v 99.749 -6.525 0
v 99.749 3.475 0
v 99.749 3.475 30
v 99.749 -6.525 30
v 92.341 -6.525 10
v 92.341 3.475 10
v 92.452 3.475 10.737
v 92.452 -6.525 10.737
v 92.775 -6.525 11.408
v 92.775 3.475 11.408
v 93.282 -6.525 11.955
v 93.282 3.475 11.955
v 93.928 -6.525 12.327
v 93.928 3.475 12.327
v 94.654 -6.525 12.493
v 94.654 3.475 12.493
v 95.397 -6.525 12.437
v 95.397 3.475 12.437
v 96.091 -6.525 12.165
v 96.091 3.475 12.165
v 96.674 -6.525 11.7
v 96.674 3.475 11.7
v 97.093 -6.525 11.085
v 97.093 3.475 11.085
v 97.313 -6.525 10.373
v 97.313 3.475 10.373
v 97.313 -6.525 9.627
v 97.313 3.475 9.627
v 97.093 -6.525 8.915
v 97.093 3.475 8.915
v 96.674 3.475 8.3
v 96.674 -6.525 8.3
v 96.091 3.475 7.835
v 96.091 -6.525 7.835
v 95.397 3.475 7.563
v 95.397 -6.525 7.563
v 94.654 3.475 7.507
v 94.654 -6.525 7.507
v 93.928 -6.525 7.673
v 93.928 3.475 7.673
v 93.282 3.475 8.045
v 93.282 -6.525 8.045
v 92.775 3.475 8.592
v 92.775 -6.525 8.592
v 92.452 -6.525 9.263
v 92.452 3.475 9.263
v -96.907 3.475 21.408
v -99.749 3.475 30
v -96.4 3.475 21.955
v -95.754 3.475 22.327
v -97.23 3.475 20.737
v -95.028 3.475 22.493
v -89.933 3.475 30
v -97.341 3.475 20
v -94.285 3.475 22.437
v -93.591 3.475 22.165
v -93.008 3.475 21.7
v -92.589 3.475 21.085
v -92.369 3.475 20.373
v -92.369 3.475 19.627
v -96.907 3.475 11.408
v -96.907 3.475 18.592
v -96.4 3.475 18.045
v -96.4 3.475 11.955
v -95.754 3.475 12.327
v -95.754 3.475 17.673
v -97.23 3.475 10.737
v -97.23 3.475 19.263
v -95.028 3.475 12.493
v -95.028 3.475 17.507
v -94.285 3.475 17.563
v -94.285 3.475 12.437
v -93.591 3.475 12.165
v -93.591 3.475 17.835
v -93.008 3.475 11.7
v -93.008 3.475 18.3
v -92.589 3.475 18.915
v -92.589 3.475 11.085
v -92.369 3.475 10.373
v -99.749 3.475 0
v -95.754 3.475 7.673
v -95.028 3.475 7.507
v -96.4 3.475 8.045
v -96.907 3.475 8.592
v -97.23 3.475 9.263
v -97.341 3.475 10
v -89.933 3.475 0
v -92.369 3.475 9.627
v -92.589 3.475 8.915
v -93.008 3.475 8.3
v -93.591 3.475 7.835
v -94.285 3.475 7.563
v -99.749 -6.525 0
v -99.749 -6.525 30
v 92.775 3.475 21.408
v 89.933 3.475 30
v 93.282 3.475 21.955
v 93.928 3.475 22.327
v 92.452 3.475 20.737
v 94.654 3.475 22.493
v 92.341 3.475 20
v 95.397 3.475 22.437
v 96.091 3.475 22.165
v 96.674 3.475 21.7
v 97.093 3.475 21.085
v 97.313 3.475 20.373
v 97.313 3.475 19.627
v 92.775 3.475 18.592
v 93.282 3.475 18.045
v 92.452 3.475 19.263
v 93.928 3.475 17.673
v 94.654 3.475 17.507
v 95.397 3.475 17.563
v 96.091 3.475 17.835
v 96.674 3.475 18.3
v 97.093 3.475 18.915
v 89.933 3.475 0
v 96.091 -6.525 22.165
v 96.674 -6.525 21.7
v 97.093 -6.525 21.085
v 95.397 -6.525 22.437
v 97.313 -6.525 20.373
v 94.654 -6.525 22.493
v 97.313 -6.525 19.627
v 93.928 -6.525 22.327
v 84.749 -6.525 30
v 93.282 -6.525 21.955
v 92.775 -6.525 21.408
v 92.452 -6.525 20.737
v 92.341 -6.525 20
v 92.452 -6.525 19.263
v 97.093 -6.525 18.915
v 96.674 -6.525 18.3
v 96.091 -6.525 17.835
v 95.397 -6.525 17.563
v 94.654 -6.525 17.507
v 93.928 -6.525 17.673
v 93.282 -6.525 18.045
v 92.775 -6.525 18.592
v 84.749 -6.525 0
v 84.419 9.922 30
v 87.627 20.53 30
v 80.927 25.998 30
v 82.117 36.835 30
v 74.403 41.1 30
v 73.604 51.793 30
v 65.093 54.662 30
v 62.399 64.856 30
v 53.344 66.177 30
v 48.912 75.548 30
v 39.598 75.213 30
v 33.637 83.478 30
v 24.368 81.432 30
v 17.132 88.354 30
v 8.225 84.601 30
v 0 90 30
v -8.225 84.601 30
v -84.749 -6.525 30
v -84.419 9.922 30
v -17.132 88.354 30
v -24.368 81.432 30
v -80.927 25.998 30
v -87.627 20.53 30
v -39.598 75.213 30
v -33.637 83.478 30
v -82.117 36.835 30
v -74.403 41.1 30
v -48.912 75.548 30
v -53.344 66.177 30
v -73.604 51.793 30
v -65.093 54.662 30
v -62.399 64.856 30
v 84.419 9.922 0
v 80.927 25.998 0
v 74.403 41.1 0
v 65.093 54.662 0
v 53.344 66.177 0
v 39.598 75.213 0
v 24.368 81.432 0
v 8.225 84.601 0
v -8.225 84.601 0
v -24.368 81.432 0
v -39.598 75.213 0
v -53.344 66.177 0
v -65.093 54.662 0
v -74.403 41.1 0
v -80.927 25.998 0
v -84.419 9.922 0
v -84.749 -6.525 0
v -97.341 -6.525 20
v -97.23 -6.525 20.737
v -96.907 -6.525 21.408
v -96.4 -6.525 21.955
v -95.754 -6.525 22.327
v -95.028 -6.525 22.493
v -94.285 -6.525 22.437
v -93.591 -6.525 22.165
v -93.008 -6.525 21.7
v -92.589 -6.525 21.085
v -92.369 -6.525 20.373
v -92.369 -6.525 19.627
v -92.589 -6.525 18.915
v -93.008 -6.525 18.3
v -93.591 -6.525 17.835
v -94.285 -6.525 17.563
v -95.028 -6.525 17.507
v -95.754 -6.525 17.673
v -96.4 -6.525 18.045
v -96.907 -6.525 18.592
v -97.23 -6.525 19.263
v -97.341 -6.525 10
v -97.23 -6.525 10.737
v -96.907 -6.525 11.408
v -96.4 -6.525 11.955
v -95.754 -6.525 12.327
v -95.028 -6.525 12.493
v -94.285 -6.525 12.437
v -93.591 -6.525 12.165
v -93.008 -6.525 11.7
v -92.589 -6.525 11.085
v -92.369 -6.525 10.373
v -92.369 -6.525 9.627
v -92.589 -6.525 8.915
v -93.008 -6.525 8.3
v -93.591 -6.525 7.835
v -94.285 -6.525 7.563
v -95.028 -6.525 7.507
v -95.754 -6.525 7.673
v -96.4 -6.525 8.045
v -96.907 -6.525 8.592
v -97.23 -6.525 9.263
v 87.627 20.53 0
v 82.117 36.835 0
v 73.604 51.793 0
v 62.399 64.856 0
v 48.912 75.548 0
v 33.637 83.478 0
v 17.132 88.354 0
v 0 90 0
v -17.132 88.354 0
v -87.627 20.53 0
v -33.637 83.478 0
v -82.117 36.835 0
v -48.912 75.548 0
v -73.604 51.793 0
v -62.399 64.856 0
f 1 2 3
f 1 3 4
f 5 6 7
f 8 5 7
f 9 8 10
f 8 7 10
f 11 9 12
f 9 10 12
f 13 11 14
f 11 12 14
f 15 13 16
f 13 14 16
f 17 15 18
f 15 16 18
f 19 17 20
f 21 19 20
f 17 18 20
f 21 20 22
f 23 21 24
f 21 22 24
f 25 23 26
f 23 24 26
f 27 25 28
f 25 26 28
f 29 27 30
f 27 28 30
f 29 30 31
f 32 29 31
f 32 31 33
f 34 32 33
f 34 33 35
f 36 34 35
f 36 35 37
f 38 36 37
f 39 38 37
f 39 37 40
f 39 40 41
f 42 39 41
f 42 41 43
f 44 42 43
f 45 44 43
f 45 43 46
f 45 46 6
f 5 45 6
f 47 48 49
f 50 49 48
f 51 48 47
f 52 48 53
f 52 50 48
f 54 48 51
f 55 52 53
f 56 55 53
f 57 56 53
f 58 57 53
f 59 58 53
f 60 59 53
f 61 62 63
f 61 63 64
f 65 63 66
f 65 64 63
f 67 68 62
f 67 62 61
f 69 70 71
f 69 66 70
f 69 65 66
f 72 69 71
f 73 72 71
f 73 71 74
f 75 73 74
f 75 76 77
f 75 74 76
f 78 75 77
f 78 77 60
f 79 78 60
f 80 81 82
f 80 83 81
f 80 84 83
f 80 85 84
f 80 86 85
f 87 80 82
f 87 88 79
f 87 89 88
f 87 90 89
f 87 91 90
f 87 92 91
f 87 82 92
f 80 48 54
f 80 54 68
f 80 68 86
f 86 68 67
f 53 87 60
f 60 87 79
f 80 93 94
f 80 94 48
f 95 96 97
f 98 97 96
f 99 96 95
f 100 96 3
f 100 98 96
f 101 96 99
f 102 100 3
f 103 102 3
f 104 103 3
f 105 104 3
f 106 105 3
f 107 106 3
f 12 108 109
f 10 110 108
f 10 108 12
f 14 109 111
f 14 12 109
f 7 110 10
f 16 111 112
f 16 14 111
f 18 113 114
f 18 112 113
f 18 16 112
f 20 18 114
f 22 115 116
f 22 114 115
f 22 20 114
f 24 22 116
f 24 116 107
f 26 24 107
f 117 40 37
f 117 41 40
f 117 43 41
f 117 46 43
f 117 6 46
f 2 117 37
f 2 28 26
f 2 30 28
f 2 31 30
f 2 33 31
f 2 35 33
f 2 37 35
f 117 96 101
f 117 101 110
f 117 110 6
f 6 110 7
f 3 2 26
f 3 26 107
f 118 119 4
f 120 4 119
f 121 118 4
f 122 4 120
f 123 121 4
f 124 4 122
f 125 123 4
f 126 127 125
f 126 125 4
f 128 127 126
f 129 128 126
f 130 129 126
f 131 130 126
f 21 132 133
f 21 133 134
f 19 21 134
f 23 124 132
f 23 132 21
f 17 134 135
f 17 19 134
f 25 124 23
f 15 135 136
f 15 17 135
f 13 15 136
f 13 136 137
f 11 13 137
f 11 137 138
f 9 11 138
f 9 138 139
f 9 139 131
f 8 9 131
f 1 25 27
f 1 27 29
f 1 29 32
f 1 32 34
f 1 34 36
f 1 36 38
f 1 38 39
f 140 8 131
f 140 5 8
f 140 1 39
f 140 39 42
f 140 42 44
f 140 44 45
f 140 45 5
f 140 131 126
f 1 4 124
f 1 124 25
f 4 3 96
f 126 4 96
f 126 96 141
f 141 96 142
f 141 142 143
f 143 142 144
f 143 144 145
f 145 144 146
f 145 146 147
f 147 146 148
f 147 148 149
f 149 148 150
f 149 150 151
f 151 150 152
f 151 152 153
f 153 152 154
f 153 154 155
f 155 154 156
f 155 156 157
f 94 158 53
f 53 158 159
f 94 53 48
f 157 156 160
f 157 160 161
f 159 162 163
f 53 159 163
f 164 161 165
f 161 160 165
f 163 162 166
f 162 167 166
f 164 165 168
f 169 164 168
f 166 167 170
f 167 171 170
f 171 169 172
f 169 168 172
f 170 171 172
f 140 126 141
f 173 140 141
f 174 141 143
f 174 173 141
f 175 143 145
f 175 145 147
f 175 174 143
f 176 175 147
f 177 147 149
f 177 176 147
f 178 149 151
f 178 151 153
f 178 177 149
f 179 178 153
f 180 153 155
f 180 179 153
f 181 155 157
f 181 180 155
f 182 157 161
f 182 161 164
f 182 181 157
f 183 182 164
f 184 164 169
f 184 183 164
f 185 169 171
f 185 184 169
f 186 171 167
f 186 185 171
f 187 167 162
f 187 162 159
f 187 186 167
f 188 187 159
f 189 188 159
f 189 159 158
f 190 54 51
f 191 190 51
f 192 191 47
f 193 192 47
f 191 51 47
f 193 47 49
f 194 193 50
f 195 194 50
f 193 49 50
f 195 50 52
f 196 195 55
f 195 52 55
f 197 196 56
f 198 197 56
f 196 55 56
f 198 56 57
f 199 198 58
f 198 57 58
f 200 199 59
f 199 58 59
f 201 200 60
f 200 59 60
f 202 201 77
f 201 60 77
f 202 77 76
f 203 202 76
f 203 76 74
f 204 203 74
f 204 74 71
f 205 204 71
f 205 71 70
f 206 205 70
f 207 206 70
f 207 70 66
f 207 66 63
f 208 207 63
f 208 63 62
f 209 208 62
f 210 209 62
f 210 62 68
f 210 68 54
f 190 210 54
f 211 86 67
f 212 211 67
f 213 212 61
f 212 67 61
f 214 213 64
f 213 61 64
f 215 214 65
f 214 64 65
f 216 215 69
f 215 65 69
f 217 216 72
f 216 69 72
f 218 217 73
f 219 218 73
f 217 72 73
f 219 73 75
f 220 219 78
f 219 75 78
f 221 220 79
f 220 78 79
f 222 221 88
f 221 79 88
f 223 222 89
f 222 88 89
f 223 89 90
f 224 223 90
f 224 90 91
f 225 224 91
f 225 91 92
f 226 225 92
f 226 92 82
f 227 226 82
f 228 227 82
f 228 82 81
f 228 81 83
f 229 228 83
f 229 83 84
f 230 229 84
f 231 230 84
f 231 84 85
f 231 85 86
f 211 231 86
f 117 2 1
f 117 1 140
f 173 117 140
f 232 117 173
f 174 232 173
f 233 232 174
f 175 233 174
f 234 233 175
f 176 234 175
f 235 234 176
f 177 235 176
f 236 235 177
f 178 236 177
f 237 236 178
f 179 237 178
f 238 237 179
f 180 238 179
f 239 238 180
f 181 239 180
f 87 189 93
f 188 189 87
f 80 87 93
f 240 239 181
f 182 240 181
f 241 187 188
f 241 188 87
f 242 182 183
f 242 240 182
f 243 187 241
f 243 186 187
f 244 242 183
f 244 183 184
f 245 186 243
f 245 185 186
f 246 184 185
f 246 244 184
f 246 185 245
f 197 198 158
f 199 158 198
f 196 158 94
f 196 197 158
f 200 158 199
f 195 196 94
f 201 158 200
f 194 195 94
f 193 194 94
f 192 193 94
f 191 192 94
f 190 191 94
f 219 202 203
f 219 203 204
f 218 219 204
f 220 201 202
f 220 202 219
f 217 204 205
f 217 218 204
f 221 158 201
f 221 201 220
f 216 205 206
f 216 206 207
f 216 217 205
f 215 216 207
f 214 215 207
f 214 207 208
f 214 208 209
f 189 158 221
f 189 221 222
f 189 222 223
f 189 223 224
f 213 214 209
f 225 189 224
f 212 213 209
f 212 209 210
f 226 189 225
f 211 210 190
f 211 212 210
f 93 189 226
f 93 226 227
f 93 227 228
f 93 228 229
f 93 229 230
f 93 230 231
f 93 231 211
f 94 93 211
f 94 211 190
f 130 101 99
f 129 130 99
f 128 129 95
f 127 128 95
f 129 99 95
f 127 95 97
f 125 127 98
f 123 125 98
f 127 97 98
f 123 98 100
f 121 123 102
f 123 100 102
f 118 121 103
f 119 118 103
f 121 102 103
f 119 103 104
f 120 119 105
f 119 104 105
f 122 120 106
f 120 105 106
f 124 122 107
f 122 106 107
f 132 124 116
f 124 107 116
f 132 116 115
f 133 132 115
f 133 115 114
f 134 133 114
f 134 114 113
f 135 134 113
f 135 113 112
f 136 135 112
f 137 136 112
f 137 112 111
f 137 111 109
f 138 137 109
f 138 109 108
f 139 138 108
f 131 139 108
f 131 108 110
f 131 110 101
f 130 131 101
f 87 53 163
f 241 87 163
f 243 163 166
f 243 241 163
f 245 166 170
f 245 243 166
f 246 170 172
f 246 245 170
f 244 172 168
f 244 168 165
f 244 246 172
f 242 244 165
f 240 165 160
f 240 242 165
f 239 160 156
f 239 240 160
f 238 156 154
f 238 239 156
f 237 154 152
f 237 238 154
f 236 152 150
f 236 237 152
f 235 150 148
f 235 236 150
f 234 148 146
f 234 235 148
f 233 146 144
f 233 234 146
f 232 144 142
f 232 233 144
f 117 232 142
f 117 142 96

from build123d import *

# Parameters (mm, degrees)
BOSS_EXTRUDE1_DEPTH = 30
SKETCH2_R           = 2.5
CUT_EXTRUDE1_DEPTH  = 30


with BuildPart() as part:
    # Sketch1 → Boss-Extrude1 (new body)
    with BuildSketch(Plane.XY):
        with BuildLine():
            Line((89.932901242, 3.47466175), (99.749159056, 3.47466175))
            Line((99.749159056, 3.47466175), (99.749159056, -6.52533825))
            Line((99.749159056, -6.52533825), (84.749159056, -6.52533825))
            ThreePointArc((84.749159056, -6.52533825), (0, 85), (-84.749159056, -6.52533825))
            Line((-84.749159056, -6.52533825), (-99.749159056, -6.52533825))
            Line((-99.749159056, -6.52533825), (-99.749159056, 3.47466175))
            Line((-99.749159056, 3.47466175), (-89.932901242, 3.47466175))
            ThreePointArc((-89.932901242, 3.47466175), (0, 90), (89.932901242, 3.47466175))
        make_face()
    extrude(amount=BOSS_EXTRUDE1_DEPTH)

    # Sketch2 → Cut-Extrude1 (cut)
    with BuildSketch(Plane(origin=(0, 3.47466175, 0), x_dir=(1, 0, 0), z_dir=(0, 1, 0))):
        with Locations(Location((-94.841030149, -10, 0), (0, 0, 180))):
            Circle(SKETCH2_R)
        with Locations(Location((-94.841030149, -20, 0), (0, 0, 180))):
            Circle(SKETCH2_R)
        with Locations(Location((94.841030149, -20, 0), (0, 0, 180))):
            Circle(SKETCH2_R)
        with Locations(Location((94.841030149, -10, 0), (0, 0, 180))):
            Circle(SKETCH2_R)
    extrude(amount=-CUT_EXTRUDE1_DEPTH, mode=Mode.SUBTRACT)


solid = part.part
